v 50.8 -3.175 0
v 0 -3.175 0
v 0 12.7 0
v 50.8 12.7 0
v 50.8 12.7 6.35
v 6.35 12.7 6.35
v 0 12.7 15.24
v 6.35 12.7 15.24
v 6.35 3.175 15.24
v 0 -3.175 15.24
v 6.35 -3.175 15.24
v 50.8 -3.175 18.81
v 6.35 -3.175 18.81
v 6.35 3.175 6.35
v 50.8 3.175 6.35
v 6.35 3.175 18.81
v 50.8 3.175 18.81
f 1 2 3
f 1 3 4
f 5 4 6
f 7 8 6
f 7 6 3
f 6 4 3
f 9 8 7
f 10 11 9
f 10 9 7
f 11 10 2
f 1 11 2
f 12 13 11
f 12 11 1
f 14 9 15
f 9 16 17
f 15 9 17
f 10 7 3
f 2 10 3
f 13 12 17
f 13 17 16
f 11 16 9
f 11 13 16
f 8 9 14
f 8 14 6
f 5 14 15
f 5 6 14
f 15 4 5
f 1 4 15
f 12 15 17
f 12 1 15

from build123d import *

# Parameters (mm, degrees)
F2_DEPTH = 3.175
F0_W     = 44.45
F0_H     = 6.35
F4_DEPTH = 6.35
F3_W     = 12.7
F3_H     = 15.24
F5_DEPTH = 6.35


with BuildPart() as f2:
    # F1 (on Front) → F2 (new body, symmetric)
    with BuildSketch(Plane.XZ):
        Polygon((0, 15.24), (0, 0), (50.8, 0), (50.8, 6.109729), (50.8, 18.809729), (6.35, 18.809729), (6.35, 15.24), align=None)
    extrude(amount=F2_DEPTH, both=True)

    # F0 (on Top) → F4 (join)
    with BuildSketch(Plane.XY):
        with Locations((28.575, 3.175)):
            Rectangle(F0_W, F0_H)
        Polygon((0, 0), (6.35, 0), (6.35, 6.35), (6.35, 12.7), (0, 12.7), align=None)
        with Locations((28.575, 9.525)):
            Rectangle(F0_W, F0_H)
    extrude(amount=F4_DEPTH)

    # F3 (on Right) → F5 (join)
    with BuildSketch(Plane.YZ):
        with Locations((6.35, 7.62)):
            Rectangle(F3_W, F3_H)
    extrude(amount=F5_DEPTH)


solid = f2.part
